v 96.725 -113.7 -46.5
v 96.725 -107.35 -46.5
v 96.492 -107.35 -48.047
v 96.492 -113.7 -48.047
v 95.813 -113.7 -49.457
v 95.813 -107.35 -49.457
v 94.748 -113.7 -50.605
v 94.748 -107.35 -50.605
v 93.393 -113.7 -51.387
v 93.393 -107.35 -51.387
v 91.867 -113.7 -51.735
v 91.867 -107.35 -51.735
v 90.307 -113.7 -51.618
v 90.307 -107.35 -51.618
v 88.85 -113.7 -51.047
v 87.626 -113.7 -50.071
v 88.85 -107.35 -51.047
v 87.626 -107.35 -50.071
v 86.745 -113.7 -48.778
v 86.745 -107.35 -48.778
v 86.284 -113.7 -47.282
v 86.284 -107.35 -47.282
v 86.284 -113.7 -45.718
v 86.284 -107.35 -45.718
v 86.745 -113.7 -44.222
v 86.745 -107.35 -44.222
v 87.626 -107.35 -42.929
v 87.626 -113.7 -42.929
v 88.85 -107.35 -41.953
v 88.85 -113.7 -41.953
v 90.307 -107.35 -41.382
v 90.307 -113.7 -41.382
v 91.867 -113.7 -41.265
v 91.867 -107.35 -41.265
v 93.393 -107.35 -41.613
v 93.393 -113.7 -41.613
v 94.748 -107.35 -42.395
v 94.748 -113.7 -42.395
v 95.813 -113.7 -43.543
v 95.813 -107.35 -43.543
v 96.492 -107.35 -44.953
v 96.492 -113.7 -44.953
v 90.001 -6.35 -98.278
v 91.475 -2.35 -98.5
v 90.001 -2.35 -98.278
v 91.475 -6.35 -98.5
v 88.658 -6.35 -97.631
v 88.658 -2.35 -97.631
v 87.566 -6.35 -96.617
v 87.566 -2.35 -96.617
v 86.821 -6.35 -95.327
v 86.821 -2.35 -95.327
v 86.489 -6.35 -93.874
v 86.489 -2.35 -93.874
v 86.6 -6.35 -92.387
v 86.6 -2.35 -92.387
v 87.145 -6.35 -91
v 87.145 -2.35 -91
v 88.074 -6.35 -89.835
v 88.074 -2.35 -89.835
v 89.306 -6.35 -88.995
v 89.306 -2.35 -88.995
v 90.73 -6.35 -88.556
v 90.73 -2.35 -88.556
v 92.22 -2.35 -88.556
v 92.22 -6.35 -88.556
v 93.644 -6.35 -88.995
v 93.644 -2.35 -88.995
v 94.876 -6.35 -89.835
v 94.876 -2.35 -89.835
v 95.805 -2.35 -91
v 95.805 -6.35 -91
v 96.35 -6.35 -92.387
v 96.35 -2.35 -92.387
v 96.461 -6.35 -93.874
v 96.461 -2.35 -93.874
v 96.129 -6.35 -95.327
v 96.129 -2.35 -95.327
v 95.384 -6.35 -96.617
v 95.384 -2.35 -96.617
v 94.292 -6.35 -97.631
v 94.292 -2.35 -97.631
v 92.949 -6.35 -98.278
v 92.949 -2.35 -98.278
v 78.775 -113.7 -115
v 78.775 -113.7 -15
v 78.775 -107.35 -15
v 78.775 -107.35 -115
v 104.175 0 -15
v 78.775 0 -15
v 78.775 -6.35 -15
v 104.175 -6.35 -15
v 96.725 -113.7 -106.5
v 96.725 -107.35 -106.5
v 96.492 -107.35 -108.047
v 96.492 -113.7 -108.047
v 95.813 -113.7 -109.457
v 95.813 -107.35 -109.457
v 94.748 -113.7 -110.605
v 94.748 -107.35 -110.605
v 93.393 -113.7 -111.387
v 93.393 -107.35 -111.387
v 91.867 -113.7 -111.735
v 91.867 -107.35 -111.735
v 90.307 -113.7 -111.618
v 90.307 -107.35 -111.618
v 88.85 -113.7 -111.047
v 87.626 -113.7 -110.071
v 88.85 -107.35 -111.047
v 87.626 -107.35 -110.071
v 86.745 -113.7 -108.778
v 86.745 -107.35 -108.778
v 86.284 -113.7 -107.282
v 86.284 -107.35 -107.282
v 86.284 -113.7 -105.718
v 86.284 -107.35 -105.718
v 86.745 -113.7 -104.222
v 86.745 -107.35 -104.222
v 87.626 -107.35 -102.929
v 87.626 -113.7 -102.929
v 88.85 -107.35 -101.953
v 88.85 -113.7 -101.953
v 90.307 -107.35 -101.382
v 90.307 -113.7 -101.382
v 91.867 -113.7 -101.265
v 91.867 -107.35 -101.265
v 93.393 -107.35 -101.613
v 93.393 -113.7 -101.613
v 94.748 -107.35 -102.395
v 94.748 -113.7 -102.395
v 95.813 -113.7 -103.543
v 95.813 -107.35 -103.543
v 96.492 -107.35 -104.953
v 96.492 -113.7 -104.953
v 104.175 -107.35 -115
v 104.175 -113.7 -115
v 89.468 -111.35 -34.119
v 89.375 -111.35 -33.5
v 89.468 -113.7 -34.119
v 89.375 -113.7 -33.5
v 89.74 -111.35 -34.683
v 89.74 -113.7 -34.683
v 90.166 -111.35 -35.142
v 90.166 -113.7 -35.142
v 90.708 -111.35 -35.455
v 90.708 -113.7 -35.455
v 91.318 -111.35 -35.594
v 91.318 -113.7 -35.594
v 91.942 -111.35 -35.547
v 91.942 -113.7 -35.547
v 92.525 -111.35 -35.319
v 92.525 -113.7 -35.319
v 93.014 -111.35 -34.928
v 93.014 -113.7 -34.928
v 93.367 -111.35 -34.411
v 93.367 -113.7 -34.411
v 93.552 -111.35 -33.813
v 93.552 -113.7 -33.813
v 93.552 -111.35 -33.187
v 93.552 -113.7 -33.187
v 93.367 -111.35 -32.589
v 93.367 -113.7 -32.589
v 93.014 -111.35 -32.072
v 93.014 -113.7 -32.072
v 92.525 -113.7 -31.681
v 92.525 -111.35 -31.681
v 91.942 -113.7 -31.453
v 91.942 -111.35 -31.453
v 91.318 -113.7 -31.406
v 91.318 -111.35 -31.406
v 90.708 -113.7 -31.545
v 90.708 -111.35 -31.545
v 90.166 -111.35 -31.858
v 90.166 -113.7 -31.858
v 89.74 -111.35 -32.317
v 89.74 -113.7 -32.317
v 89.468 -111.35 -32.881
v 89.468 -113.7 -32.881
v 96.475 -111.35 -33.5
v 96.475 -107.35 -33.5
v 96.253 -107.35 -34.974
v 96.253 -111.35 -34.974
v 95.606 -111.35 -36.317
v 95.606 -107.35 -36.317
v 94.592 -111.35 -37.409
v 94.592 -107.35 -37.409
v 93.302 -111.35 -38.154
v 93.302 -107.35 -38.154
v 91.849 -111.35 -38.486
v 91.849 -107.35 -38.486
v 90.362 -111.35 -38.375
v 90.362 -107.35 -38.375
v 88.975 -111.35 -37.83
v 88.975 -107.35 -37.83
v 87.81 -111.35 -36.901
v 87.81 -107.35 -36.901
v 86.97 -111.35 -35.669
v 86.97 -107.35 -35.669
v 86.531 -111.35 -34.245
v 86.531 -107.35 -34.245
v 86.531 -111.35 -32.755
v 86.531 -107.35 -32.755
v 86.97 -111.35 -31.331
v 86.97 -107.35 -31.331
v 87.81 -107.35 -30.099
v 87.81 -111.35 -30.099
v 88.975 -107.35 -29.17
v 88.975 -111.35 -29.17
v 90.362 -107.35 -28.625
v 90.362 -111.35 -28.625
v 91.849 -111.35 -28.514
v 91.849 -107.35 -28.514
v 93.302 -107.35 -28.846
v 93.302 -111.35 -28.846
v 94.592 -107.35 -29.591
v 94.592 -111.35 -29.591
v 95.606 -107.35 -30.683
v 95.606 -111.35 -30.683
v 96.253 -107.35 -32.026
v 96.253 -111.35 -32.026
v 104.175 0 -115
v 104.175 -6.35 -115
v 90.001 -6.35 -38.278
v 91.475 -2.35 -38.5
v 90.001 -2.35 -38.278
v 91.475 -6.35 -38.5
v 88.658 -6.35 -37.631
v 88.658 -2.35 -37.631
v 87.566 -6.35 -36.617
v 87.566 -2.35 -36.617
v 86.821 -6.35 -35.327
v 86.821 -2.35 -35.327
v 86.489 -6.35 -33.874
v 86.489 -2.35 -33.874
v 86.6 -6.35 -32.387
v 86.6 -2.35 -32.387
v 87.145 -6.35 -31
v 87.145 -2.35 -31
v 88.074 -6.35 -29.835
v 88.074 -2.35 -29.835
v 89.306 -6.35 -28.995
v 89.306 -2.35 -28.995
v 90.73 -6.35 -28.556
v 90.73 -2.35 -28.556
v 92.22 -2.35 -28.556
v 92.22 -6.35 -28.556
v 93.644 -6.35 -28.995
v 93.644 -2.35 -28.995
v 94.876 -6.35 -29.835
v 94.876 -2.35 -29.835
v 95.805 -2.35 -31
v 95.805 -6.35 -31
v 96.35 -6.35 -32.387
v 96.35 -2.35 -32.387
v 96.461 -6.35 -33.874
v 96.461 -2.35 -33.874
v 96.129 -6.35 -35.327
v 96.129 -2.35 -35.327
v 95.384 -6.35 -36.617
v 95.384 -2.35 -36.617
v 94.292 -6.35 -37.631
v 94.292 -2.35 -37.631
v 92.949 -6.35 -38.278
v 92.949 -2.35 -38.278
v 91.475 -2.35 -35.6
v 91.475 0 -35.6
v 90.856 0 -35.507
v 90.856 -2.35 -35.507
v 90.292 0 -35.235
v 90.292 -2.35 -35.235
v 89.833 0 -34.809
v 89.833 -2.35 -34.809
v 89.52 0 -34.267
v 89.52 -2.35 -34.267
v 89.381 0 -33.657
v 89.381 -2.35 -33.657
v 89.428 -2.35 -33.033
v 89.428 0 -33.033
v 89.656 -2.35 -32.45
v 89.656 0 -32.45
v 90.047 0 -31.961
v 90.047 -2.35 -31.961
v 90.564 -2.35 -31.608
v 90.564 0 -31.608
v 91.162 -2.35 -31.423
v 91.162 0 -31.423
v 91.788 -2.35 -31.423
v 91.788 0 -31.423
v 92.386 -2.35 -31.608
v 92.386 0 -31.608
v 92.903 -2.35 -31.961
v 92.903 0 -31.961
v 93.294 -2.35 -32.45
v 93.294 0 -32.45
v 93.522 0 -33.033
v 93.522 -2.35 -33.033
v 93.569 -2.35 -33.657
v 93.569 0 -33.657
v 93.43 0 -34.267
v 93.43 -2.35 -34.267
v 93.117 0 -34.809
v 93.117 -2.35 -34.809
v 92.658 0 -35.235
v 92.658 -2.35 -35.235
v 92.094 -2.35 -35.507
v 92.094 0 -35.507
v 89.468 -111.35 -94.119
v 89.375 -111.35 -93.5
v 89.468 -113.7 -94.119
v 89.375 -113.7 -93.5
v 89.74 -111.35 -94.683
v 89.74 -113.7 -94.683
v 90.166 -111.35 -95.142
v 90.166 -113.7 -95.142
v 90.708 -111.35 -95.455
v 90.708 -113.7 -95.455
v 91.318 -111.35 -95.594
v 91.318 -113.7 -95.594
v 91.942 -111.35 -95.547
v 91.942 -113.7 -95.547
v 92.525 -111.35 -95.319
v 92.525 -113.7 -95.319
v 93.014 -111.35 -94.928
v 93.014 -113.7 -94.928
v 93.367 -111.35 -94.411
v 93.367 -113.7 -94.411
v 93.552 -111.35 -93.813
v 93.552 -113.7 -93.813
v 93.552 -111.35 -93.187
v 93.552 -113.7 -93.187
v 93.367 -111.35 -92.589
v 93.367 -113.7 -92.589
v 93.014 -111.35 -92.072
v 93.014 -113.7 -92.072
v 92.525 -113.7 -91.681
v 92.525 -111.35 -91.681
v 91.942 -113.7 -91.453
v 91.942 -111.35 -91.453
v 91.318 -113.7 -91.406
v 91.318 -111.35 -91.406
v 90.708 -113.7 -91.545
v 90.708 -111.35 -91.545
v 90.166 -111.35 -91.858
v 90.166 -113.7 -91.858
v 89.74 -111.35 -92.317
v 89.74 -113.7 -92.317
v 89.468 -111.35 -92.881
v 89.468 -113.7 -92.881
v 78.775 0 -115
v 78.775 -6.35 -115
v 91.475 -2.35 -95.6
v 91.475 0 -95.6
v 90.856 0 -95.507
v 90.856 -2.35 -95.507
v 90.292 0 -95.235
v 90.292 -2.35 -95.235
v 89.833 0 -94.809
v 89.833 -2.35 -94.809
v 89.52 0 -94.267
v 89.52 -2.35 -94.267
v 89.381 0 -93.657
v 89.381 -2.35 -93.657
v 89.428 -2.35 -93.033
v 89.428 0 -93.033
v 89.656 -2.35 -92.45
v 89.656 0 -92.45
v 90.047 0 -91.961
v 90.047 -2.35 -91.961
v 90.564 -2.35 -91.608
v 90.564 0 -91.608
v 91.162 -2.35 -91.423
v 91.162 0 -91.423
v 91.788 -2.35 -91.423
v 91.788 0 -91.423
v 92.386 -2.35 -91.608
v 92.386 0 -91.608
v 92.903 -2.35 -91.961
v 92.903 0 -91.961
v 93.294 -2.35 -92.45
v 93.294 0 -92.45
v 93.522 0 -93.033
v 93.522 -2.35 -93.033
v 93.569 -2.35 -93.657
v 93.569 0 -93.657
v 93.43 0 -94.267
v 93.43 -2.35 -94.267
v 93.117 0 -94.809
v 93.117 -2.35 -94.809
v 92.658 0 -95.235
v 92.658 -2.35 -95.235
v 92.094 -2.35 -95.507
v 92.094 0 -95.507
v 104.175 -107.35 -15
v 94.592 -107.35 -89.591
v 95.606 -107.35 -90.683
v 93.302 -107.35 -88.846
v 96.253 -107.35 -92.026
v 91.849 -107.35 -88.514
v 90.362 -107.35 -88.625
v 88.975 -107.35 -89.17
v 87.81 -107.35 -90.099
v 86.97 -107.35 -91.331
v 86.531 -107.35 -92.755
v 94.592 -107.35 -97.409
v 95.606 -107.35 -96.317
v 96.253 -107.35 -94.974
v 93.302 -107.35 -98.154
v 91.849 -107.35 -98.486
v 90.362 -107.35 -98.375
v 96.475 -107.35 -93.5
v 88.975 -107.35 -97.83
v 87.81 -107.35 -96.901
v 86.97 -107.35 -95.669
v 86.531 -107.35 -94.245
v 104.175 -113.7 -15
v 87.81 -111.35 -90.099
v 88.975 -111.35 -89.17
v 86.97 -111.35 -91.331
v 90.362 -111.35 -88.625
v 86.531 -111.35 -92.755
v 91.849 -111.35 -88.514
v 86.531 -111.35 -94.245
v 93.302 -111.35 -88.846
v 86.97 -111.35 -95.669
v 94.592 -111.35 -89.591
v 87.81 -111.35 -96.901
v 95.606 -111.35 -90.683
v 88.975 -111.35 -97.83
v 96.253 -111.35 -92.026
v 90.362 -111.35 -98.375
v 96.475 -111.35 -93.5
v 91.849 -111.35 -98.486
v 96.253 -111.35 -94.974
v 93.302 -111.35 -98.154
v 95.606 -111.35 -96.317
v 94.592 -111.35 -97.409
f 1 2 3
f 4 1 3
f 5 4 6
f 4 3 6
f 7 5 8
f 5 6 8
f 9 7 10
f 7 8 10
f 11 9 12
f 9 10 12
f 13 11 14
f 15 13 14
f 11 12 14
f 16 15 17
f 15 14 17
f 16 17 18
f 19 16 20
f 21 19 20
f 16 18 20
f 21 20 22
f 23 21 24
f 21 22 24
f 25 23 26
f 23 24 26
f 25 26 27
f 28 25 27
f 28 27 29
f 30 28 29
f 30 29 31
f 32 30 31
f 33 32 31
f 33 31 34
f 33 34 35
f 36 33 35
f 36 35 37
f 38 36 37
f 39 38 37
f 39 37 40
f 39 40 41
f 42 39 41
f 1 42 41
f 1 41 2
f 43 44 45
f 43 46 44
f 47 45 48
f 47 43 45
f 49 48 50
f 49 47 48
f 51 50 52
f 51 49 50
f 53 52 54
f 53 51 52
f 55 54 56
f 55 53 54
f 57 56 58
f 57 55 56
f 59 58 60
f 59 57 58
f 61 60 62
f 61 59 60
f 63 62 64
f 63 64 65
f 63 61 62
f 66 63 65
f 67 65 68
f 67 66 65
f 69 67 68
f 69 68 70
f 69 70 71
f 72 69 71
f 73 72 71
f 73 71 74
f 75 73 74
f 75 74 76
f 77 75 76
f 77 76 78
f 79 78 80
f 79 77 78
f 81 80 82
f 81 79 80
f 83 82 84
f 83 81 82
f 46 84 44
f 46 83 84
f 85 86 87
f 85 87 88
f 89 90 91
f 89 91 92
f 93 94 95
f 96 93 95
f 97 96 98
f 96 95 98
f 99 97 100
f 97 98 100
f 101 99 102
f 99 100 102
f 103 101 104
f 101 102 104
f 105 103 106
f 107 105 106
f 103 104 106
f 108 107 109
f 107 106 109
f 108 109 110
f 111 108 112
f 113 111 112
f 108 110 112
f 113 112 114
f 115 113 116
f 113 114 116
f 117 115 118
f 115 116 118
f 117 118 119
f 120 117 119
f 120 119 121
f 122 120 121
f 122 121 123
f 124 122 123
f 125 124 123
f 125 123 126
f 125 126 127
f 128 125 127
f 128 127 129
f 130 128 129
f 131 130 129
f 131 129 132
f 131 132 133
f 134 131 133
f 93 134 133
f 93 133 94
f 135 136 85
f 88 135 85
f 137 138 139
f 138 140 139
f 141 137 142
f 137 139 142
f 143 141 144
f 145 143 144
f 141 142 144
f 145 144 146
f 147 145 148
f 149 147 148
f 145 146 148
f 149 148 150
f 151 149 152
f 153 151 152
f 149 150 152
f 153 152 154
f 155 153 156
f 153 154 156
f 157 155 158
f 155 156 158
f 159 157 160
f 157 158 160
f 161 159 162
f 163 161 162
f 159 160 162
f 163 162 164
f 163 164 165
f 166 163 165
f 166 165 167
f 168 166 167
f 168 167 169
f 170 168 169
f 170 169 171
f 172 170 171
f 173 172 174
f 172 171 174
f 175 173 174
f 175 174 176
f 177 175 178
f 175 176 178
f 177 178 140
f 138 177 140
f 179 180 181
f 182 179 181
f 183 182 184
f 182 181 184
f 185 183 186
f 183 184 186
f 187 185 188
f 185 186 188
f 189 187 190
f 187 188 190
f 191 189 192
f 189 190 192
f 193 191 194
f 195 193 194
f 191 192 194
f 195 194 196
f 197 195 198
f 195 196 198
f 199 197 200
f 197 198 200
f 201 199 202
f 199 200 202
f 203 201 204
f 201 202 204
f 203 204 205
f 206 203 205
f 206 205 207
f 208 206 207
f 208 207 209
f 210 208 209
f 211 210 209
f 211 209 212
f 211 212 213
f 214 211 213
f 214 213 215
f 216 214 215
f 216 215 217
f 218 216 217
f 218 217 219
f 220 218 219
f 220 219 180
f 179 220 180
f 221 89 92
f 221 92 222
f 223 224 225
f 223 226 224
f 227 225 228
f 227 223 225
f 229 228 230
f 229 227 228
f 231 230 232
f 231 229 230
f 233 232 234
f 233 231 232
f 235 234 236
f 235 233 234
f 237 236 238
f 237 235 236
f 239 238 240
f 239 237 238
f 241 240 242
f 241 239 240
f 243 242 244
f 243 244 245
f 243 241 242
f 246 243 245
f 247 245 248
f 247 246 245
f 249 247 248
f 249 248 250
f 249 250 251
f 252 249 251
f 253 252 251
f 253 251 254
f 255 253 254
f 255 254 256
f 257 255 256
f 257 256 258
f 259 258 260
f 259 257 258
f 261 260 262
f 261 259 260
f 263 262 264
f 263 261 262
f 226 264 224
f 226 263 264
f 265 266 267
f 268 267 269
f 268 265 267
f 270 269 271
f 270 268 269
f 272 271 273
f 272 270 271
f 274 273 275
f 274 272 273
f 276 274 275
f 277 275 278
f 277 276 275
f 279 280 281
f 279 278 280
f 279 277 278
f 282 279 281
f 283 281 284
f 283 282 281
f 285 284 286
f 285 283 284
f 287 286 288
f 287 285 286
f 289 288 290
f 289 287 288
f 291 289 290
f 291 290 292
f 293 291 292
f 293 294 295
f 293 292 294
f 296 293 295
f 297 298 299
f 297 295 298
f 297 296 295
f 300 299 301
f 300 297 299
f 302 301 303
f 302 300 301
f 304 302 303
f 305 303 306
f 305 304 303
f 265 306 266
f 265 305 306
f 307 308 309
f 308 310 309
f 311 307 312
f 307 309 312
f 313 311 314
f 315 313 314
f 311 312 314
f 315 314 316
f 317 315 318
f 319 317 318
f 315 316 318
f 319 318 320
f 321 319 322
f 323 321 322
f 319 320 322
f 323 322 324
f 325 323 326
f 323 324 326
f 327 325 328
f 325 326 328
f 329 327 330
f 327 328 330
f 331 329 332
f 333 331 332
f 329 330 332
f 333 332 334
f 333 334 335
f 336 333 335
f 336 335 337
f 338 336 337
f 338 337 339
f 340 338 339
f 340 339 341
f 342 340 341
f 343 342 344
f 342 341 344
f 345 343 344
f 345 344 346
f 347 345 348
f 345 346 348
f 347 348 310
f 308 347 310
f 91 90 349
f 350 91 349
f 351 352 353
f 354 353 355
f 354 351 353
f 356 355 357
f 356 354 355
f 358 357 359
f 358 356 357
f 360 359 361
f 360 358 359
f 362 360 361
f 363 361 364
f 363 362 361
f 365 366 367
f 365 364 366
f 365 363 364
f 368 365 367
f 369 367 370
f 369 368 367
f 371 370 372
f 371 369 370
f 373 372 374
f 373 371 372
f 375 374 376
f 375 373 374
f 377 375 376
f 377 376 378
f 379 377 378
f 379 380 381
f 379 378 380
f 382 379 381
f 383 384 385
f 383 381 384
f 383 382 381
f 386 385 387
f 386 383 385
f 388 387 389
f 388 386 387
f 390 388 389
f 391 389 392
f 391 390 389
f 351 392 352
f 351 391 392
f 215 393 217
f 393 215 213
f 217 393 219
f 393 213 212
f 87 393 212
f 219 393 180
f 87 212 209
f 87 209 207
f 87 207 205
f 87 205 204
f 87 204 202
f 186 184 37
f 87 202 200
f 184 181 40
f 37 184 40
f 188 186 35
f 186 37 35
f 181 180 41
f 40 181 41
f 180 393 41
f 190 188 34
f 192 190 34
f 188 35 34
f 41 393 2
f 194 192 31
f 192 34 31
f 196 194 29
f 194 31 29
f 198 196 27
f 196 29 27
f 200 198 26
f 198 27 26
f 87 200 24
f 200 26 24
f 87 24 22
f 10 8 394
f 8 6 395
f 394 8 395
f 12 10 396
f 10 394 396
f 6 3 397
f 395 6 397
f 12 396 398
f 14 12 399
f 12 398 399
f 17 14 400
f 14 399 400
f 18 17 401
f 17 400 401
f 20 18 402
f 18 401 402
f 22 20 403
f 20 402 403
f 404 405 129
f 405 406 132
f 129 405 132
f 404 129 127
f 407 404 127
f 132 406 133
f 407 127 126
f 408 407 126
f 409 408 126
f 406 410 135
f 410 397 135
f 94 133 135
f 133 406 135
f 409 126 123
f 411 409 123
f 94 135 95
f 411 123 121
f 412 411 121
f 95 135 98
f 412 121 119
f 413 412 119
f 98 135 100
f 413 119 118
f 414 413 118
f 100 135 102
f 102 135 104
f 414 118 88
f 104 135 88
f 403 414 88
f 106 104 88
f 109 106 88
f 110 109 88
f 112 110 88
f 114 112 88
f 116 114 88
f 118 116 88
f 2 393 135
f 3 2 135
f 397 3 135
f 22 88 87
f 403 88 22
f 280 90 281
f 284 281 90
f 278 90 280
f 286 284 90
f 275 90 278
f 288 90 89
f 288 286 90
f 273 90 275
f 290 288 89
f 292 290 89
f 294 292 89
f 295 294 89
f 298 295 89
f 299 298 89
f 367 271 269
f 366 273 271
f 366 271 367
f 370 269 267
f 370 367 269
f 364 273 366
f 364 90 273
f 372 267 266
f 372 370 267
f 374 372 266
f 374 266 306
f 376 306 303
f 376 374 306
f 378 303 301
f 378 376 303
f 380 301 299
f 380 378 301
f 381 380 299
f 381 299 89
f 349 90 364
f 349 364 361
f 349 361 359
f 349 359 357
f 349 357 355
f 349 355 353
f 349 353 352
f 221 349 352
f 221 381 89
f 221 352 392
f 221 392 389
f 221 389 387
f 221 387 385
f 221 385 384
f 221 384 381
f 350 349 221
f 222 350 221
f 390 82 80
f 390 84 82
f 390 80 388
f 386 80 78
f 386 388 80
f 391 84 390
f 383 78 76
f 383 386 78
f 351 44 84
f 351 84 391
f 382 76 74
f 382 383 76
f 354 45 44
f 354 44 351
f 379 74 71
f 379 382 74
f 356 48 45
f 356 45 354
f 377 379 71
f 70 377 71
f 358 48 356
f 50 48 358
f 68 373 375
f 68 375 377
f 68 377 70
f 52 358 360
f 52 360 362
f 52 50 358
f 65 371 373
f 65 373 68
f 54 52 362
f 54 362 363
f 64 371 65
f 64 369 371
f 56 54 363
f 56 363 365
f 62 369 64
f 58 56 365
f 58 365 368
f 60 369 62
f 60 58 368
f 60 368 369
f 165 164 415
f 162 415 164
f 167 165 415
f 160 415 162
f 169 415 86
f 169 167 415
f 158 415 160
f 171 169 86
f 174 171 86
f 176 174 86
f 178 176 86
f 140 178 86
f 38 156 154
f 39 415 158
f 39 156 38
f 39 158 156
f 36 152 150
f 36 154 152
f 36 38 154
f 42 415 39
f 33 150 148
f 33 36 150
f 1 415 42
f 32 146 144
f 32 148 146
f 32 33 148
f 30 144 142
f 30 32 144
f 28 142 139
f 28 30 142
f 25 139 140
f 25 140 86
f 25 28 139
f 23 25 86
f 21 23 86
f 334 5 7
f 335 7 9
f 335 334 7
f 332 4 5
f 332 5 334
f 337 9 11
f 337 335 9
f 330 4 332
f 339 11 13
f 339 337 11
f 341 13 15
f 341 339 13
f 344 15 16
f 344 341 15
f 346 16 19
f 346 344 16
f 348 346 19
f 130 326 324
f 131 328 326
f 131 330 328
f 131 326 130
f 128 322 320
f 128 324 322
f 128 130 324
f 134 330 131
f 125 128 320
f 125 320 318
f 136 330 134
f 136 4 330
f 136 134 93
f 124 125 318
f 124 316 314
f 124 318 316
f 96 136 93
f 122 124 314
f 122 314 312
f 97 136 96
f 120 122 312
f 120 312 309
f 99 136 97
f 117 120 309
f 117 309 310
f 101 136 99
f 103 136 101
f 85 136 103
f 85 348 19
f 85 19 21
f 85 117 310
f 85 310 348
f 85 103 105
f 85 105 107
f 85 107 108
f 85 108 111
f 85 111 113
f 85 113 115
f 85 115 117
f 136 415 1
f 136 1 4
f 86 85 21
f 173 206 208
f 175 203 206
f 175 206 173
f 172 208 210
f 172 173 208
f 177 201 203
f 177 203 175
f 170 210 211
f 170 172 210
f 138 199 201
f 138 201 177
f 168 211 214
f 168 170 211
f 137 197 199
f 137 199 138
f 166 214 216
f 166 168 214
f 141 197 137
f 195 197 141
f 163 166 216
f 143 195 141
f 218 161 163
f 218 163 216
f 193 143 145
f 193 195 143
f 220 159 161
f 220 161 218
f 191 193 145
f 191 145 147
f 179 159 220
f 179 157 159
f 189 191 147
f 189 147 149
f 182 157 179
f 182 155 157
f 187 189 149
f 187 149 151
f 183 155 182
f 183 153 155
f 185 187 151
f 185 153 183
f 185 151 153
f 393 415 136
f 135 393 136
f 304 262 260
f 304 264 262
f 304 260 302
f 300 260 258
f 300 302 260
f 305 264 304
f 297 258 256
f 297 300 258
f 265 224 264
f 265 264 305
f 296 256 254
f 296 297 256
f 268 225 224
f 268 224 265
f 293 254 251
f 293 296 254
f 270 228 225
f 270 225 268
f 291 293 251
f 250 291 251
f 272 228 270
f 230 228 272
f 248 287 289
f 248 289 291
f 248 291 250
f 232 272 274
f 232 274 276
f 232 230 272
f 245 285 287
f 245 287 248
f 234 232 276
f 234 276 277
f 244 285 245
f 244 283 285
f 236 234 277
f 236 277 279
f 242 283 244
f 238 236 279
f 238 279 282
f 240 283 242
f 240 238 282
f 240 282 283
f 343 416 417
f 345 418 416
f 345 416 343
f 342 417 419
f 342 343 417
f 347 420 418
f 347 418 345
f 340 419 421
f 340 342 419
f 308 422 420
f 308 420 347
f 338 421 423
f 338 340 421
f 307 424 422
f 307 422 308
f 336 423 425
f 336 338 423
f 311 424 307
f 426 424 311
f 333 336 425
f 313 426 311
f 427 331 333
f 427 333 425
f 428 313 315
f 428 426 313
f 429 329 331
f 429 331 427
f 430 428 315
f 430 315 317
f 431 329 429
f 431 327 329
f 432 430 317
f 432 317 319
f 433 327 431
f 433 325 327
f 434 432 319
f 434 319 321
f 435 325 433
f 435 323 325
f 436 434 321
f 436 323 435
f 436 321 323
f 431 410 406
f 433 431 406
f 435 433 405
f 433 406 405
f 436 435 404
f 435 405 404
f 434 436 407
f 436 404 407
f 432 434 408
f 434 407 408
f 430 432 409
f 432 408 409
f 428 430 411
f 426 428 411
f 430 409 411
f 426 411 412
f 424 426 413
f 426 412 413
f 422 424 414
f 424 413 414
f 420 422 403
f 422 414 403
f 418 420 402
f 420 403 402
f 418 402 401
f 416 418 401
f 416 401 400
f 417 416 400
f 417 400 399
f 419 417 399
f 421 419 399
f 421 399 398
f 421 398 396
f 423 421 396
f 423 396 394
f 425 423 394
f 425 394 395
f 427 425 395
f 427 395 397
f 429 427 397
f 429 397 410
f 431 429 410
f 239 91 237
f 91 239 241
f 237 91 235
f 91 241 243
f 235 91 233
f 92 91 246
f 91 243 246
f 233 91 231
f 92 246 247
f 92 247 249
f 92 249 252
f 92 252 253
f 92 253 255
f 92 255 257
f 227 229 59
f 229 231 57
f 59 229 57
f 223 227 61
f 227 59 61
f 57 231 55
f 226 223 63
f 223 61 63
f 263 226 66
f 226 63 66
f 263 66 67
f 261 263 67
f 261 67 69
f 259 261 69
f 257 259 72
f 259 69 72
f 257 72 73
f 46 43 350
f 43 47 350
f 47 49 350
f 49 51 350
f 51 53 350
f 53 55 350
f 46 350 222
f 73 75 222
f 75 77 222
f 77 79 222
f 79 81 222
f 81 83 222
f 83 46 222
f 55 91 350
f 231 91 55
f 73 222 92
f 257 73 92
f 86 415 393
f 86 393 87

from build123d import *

# Parameters (mm, degrees)
SKETCH9_W                                          = 25.4
SKETCH9_H                                          = 100
BOSS_EXTRUDE2_DEPTH                                = 6.35
F_10_5_10_5_DIAMETER_HOLE2_D                       = 10.5
CBORE_FOR_M3_5_HEX_HEAD_MACHINE_SCREW2_D           = 4.2
CBORE_FOR_M3_5_HEX_HEAD_MACHINE_SCREW2_CBORE_D     = 10
CBORE_FOR_M3_5_HEX_HEAD_MACHINE_SCREW2_CBORE_DEPTH = 4
SKETCH16_W                                         = 25.4
SKETCH16_H                                         = 100
BOSS_EXTRUDE3_DEPTH                                = 6.35
CBORE_FOR_M3_5_HEX_HEAD_MACHINE_SCREW3_A_COUNT     = 2
CBORE_FOR_M3_5_HEX_HEAD_MACHINE_SCREW3_A_PITCH     = 60


with BuildPart() as part:
    # Sketch9 → Boss-Extrude2 (new body)
    with BuildSketch(Plane(origin=(0, -113.7, 0), x_dir=(-1, 0, 0), z_dir=(0, -1, 0))):
        with Locations((-91.475, 65)):
            Rectangle(SKETCH9_W, SKETCH9_H)
    extrude(amount=-BOSS_EXTRUDE2_DEPTH)

    # Ø10.5 (10.5) Diameter Hole2 (through all)
    with Locations(Plane(origin=(0, -113.7, 0), x_dir=(-1, 0, 0), z_dir=(0, -1, 0))):
        with Locations((-91.475, 106.5), (-91.475, 46.5)):
            Hole(F_10_5_10_5_DIAMETER_HOLE2_D / 2)

    # CBORE for M3.5 Hex Head Machine Screw2 (through all)
    with Locations(Plane(origin=(0, -107.35, 0), x_dir=(1, 0, 0), z_dir=(0, 1, 0))):
        with Locations((91.475, 33.5), (91.475, 93.5)):
            CounterBoreHole(CBORE_FOR_M3_5_HEX_HEAD_MACHINE_SCREW2_D / 2, CBORE_FOR_M3_5_HEX_HEAD_MACHINE_SCREW2_CBORE_D / 2, CBORE_FOR_M3_5_HEX_HEAD_MACHINE_SCREW2_CBORE_DEPTH)


with BuildPart() as body_2:
    # Sketch16 → Boss-Extrude3 (new body)
    with BuildSketch(Plane(origin=(0, 0, 0), x_dir=(1, 0, 0), z_dir=(0, 1, 0))):
        with Locations((91.475, 65)):
            Rectangle(SKETCH16_W, SKETCH16_H)
    extrude(amount=-BOSS_EXTRUDE3_DEPTH)

    # Sketch17 → CBORE for M3.5 Hex Head Machine Screw3 (revolve, cut)
    with BuildSketch(Plane(origin=(91.475, -6.35, -33.5), x_dir=(0, 0, -1), z_dir=(1, 0, 0))):
        Polygon((0, 0), (0, 9.525), (2.1, 9.525), (2.1, 4), (5, 4), (5, 0), align=None)
    cbore_for_m3_5_hex_head_machine_screw3 = revolve(axis=Axis((91.475, -12.7, -33.5), (0, 1, 0)), mode=Mode.SUBTRACT)

    # CBORE for M3.5 Hex Head Machine Screw3 a: CBORE for M3.5 Hex Head Machine Screw3 ×2
    with Locations(*[(0, 0, -i * CBORE_FOR_M3_5_HEX_HEAD_MACHINE_SCREW3_A_PITCH) for i in range(1, CBORE_FOR_M3_5_HEX_HEAD_MACHINE_SCREW3_A_COUNT)]):
        add(cbore_for_m3_5_hex_head_machine_screw3, mode=Mode.SUBTRACT)


solid = Compound([part.part, body_2.part])
